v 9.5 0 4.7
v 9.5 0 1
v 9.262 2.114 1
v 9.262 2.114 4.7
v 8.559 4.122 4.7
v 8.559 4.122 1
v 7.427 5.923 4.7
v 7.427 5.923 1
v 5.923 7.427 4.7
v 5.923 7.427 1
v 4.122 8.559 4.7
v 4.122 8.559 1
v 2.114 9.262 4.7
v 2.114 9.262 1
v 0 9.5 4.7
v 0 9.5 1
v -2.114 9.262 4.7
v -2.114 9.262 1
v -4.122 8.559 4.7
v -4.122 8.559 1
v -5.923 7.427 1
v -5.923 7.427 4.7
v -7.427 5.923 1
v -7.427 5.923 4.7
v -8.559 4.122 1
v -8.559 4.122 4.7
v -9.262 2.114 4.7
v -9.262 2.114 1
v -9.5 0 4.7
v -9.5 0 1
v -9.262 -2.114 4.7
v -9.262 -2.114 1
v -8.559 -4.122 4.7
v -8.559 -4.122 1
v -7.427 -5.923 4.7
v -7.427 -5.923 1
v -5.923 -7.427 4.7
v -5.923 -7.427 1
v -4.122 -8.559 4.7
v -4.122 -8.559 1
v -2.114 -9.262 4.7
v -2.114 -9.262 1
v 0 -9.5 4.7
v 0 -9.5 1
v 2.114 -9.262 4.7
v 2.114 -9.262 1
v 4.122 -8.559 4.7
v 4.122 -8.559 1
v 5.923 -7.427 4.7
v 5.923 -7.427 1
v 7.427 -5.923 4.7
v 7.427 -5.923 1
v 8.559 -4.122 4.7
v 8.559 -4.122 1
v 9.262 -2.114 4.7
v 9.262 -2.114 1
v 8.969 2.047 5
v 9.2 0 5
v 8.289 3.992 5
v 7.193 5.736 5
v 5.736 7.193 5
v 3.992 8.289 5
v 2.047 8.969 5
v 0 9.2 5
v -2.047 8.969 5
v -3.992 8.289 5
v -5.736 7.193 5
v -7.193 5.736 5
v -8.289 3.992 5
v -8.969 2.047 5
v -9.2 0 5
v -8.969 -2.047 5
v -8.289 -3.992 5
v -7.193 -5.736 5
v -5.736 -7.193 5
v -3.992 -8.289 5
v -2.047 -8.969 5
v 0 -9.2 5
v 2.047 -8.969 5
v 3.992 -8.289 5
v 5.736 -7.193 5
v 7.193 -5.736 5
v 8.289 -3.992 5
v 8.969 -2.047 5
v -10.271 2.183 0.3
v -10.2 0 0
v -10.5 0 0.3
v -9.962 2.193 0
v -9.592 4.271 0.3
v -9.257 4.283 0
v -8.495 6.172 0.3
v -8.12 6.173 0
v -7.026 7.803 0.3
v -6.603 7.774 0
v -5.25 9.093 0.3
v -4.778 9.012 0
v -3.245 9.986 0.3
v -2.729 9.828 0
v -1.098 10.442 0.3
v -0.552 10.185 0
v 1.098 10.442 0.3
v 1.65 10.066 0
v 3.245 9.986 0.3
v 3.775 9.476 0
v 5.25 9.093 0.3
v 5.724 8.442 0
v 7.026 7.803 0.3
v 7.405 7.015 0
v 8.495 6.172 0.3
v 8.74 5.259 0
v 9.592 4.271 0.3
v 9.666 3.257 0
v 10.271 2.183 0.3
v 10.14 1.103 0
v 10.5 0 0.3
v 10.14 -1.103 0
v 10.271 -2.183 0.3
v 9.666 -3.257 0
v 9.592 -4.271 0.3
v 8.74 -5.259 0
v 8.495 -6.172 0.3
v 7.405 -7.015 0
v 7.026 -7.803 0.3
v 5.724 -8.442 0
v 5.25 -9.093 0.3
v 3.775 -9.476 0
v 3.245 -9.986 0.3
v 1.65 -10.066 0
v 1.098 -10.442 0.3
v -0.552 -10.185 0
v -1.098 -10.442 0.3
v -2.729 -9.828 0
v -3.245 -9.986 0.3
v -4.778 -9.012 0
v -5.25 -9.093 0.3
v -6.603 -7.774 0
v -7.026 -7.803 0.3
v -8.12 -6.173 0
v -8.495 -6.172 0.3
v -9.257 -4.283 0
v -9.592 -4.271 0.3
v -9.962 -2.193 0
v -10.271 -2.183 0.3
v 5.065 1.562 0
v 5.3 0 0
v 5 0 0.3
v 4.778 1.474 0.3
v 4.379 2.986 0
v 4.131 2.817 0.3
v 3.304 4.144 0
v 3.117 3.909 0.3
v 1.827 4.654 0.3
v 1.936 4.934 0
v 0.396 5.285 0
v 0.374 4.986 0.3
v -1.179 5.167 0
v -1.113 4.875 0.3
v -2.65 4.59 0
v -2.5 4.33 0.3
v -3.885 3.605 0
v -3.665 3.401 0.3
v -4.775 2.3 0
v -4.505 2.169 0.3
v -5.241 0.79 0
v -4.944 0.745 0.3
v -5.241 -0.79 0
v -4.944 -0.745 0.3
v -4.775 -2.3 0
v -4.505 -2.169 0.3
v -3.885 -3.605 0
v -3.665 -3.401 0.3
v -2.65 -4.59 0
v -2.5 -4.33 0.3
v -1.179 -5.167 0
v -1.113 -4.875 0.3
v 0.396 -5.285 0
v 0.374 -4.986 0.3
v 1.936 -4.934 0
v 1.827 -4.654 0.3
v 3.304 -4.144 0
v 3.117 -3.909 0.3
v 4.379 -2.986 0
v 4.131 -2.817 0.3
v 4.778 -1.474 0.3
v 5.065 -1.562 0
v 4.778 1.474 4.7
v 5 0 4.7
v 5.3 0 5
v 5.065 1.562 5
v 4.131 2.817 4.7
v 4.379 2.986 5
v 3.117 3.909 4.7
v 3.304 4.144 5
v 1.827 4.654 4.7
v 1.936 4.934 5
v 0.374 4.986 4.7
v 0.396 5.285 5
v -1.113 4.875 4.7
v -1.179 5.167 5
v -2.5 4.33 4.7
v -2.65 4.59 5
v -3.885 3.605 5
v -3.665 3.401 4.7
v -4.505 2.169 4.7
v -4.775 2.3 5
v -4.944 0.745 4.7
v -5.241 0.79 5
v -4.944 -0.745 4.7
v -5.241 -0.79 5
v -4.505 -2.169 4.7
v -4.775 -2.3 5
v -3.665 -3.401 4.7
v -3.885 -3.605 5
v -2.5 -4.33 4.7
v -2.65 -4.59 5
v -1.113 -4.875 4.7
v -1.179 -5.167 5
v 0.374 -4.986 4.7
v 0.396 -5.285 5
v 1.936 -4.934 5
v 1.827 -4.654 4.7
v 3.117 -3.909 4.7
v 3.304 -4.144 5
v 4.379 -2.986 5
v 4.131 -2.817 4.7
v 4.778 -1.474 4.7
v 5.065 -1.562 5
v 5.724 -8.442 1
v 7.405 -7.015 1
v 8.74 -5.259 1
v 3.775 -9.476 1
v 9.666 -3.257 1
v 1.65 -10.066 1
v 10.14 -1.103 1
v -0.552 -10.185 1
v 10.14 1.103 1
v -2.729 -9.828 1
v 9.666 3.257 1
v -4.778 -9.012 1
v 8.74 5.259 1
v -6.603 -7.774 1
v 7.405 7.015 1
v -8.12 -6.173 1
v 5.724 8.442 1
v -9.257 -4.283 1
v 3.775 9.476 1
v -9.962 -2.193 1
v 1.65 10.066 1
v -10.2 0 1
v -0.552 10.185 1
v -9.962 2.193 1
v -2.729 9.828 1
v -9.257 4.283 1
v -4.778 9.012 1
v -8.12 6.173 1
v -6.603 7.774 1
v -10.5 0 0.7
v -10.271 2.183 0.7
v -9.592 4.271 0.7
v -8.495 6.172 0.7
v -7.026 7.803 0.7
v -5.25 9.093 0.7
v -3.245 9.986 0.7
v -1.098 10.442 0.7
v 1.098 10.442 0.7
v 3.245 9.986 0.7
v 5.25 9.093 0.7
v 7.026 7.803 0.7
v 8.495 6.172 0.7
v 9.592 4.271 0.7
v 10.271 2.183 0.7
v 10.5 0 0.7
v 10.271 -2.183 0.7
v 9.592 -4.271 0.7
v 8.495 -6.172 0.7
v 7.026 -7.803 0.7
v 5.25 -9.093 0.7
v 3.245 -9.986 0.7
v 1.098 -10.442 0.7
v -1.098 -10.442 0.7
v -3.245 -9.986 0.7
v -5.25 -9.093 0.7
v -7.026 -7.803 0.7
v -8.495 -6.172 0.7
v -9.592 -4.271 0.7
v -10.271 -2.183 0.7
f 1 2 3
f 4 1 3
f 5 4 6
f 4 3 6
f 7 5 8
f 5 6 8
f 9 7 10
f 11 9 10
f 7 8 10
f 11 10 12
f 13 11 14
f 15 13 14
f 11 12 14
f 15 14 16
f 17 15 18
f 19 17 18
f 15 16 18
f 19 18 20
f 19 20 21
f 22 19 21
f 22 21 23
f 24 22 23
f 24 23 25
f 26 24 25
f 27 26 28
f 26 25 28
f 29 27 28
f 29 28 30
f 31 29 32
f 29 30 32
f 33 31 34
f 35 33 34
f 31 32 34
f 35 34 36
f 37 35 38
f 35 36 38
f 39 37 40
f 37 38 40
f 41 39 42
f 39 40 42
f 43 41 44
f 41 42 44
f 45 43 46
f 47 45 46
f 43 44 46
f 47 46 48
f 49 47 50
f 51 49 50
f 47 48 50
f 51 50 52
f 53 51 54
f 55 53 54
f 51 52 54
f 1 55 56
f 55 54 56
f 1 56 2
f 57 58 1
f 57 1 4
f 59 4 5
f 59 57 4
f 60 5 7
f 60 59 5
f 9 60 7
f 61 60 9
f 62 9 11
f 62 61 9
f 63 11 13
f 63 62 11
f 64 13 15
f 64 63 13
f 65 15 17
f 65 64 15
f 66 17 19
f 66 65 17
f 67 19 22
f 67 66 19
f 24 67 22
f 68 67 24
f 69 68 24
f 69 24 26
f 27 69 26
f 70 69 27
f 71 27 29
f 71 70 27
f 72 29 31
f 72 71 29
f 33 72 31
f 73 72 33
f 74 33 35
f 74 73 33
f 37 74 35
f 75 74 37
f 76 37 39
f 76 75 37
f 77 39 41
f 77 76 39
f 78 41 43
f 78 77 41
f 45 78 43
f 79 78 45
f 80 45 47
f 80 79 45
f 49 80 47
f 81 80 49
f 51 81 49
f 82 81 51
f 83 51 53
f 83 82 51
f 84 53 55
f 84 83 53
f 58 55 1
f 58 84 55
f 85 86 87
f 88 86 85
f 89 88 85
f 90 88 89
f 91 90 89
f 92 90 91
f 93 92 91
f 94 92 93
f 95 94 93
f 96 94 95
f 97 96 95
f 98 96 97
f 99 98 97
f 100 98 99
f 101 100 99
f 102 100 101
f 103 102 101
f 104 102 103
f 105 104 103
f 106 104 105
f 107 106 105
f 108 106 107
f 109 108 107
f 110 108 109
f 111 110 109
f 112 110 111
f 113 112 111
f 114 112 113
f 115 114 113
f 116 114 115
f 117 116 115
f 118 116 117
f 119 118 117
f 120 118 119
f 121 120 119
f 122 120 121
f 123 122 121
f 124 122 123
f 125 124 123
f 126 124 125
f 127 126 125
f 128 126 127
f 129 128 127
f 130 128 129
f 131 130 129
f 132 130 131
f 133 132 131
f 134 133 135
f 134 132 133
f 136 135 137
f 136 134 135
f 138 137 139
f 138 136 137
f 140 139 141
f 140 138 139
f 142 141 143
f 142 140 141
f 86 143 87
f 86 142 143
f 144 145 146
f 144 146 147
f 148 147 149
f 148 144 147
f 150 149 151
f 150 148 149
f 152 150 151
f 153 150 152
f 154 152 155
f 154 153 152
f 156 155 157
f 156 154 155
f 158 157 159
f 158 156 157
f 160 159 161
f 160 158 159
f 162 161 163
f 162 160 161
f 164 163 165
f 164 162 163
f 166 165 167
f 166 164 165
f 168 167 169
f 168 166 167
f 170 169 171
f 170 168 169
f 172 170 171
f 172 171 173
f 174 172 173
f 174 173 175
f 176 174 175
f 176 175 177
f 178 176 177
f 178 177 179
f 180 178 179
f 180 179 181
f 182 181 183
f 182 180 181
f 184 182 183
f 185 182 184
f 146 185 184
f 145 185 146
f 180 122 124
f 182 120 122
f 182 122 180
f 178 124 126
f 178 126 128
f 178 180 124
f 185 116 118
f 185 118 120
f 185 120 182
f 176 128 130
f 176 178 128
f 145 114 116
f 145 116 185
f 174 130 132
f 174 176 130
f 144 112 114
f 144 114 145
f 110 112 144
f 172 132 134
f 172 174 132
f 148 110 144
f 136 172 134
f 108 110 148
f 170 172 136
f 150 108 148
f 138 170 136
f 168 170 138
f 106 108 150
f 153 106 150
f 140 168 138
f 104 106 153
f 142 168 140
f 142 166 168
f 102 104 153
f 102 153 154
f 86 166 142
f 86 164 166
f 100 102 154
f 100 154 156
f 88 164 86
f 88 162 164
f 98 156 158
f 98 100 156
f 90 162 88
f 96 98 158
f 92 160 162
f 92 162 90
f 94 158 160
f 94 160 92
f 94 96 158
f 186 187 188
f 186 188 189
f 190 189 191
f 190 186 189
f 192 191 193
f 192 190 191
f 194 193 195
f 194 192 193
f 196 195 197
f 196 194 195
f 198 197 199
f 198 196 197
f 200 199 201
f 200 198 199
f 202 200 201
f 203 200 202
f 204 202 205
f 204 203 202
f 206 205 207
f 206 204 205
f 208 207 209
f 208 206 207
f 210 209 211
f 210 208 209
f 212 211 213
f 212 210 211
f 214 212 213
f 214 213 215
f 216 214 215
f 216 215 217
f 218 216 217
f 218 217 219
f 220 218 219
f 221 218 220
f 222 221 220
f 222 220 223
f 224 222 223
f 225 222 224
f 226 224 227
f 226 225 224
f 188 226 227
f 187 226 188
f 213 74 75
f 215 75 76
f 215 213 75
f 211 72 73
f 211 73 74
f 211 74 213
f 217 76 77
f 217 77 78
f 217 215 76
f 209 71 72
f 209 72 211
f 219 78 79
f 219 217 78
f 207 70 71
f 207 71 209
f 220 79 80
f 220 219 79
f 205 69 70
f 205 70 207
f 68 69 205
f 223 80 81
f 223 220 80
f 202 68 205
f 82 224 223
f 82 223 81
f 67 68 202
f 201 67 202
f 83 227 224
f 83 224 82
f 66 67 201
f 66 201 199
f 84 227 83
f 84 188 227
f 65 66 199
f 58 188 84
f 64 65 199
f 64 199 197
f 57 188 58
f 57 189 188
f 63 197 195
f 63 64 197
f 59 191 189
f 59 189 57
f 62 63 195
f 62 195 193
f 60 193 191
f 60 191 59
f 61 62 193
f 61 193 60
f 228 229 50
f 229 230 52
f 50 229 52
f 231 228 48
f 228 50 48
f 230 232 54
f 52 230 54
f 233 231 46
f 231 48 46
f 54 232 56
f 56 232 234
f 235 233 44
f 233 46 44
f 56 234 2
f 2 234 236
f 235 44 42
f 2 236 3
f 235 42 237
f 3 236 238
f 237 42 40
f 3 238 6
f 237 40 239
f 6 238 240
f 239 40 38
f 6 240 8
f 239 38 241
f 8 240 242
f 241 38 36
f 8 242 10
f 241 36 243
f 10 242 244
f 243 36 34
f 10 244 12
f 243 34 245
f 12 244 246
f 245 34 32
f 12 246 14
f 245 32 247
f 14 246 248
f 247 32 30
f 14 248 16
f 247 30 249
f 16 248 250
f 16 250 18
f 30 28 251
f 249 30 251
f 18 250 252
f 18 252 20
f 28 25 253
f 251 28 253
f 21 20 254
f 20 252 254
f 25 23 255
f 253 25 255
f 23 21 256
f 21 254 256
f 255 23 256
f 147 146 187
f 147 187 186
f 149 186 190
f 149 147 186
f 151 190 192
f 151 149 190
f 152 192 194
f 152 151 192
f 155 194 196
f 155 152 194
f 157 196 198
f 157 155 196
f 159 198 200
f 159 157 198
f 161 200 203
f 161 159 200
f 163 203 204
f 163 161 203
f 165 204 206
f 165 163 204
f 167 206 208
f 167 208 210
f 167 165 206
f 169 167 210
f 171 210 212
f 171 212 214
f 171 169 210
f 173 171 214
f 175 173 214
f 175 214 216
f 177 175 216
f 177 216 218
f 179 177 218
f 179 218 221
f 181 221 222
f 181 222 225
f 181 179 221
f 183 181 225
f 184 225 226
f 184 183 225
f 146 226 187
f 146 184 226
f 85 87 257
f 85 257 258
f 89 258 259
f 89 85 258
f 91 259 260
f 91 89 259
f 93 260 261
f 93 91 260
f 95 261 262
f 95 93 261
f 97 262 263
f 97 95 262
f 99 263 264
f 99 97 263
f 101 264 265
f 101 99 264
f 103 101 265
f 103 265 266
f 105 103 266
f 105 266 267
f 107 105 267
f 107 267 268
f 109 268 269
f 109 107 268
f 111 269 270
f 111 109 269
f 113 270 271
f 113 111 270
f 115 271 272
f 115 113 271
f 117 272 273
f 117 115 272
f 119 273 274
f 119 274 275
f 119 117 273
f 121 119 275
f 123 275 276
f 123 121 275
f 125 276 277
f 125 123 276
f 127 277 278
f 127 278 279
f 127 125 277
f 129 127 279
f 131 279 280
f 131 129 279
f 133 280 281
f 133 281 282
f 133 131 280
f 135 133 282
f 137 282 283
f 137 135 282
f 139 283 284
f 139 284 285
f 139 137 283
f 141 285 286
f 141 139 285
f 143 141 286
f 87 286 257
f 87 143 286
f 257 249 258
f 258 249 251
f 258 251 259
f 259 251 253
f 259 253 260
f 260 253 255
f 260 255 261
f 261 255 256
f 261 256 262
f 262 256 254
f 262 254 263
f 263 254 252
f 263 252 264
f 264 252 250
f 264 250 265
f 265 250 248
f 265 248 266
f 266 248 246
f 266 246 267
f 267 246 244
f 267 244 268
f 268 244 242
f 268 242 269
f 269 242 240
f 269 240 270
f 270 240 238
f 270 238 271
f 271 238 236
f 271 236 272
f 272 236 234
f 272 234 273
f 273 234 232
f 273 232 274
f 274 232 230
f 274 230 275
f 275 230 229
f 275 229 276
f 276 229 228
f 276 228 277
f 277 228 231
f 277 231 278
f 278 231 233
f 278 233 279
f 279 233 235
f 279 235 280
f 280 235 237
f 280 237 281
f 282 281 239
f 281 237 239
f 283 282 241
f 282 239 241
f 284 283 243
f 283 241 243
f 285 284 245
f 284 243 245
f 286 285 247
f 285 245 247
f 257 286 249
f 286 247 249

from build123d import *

# Parameters (mm, degrees)
SKETCH_1_R      = 9.5
SKETCH_1_R_2    = 5
EXTRUDE_1_DEPTH = 5
SKETCH_2_R      = 10.5
SKETCH_2_R_2    = 9.5
EXTRUDE_2_DEPTH = 1
CHAMFER_1_SIZE  = 0.3


with BuildPart() as part:
    # 草图1 → 凸台-拉伸1 (new body)
    with BuildSketch(Plane.XY):
        Circle(SKETCH_1_R)
        Circle(SKETCH_1_R_2, mode=Mode.SUBTRACT)
    extrude(amount=EXTRUDE_1_DEPTH)

    # 草图2 → 凸台-拉伸2 (add)
    with BuildSketch(Plane(origin=(0, 0, 0), x_dir=(-1, 0, 0), z_dir=(0, 0, -1))):
        Circle(SKETCH_2_R)
        Circle(SKETCH_2_R_2, mode=Mode.SUBTRACT)
    extrude(amount=-EXTRUDE_2_DEPTH)

    # 倒角1
    chamfer_1_edges = [part.edges().sort_by_distance(p)[0] for p in [
        (10.5, 0, 1),
        (10.5, 0, 0),
        (-9.5, 0, 5),
        (-5, 0, 0),
        (-5, 0, 5),
    ]]
    chamfer(chamfer_1_edges, length=CHAMFER_1_SIZE)


solid = part.part
